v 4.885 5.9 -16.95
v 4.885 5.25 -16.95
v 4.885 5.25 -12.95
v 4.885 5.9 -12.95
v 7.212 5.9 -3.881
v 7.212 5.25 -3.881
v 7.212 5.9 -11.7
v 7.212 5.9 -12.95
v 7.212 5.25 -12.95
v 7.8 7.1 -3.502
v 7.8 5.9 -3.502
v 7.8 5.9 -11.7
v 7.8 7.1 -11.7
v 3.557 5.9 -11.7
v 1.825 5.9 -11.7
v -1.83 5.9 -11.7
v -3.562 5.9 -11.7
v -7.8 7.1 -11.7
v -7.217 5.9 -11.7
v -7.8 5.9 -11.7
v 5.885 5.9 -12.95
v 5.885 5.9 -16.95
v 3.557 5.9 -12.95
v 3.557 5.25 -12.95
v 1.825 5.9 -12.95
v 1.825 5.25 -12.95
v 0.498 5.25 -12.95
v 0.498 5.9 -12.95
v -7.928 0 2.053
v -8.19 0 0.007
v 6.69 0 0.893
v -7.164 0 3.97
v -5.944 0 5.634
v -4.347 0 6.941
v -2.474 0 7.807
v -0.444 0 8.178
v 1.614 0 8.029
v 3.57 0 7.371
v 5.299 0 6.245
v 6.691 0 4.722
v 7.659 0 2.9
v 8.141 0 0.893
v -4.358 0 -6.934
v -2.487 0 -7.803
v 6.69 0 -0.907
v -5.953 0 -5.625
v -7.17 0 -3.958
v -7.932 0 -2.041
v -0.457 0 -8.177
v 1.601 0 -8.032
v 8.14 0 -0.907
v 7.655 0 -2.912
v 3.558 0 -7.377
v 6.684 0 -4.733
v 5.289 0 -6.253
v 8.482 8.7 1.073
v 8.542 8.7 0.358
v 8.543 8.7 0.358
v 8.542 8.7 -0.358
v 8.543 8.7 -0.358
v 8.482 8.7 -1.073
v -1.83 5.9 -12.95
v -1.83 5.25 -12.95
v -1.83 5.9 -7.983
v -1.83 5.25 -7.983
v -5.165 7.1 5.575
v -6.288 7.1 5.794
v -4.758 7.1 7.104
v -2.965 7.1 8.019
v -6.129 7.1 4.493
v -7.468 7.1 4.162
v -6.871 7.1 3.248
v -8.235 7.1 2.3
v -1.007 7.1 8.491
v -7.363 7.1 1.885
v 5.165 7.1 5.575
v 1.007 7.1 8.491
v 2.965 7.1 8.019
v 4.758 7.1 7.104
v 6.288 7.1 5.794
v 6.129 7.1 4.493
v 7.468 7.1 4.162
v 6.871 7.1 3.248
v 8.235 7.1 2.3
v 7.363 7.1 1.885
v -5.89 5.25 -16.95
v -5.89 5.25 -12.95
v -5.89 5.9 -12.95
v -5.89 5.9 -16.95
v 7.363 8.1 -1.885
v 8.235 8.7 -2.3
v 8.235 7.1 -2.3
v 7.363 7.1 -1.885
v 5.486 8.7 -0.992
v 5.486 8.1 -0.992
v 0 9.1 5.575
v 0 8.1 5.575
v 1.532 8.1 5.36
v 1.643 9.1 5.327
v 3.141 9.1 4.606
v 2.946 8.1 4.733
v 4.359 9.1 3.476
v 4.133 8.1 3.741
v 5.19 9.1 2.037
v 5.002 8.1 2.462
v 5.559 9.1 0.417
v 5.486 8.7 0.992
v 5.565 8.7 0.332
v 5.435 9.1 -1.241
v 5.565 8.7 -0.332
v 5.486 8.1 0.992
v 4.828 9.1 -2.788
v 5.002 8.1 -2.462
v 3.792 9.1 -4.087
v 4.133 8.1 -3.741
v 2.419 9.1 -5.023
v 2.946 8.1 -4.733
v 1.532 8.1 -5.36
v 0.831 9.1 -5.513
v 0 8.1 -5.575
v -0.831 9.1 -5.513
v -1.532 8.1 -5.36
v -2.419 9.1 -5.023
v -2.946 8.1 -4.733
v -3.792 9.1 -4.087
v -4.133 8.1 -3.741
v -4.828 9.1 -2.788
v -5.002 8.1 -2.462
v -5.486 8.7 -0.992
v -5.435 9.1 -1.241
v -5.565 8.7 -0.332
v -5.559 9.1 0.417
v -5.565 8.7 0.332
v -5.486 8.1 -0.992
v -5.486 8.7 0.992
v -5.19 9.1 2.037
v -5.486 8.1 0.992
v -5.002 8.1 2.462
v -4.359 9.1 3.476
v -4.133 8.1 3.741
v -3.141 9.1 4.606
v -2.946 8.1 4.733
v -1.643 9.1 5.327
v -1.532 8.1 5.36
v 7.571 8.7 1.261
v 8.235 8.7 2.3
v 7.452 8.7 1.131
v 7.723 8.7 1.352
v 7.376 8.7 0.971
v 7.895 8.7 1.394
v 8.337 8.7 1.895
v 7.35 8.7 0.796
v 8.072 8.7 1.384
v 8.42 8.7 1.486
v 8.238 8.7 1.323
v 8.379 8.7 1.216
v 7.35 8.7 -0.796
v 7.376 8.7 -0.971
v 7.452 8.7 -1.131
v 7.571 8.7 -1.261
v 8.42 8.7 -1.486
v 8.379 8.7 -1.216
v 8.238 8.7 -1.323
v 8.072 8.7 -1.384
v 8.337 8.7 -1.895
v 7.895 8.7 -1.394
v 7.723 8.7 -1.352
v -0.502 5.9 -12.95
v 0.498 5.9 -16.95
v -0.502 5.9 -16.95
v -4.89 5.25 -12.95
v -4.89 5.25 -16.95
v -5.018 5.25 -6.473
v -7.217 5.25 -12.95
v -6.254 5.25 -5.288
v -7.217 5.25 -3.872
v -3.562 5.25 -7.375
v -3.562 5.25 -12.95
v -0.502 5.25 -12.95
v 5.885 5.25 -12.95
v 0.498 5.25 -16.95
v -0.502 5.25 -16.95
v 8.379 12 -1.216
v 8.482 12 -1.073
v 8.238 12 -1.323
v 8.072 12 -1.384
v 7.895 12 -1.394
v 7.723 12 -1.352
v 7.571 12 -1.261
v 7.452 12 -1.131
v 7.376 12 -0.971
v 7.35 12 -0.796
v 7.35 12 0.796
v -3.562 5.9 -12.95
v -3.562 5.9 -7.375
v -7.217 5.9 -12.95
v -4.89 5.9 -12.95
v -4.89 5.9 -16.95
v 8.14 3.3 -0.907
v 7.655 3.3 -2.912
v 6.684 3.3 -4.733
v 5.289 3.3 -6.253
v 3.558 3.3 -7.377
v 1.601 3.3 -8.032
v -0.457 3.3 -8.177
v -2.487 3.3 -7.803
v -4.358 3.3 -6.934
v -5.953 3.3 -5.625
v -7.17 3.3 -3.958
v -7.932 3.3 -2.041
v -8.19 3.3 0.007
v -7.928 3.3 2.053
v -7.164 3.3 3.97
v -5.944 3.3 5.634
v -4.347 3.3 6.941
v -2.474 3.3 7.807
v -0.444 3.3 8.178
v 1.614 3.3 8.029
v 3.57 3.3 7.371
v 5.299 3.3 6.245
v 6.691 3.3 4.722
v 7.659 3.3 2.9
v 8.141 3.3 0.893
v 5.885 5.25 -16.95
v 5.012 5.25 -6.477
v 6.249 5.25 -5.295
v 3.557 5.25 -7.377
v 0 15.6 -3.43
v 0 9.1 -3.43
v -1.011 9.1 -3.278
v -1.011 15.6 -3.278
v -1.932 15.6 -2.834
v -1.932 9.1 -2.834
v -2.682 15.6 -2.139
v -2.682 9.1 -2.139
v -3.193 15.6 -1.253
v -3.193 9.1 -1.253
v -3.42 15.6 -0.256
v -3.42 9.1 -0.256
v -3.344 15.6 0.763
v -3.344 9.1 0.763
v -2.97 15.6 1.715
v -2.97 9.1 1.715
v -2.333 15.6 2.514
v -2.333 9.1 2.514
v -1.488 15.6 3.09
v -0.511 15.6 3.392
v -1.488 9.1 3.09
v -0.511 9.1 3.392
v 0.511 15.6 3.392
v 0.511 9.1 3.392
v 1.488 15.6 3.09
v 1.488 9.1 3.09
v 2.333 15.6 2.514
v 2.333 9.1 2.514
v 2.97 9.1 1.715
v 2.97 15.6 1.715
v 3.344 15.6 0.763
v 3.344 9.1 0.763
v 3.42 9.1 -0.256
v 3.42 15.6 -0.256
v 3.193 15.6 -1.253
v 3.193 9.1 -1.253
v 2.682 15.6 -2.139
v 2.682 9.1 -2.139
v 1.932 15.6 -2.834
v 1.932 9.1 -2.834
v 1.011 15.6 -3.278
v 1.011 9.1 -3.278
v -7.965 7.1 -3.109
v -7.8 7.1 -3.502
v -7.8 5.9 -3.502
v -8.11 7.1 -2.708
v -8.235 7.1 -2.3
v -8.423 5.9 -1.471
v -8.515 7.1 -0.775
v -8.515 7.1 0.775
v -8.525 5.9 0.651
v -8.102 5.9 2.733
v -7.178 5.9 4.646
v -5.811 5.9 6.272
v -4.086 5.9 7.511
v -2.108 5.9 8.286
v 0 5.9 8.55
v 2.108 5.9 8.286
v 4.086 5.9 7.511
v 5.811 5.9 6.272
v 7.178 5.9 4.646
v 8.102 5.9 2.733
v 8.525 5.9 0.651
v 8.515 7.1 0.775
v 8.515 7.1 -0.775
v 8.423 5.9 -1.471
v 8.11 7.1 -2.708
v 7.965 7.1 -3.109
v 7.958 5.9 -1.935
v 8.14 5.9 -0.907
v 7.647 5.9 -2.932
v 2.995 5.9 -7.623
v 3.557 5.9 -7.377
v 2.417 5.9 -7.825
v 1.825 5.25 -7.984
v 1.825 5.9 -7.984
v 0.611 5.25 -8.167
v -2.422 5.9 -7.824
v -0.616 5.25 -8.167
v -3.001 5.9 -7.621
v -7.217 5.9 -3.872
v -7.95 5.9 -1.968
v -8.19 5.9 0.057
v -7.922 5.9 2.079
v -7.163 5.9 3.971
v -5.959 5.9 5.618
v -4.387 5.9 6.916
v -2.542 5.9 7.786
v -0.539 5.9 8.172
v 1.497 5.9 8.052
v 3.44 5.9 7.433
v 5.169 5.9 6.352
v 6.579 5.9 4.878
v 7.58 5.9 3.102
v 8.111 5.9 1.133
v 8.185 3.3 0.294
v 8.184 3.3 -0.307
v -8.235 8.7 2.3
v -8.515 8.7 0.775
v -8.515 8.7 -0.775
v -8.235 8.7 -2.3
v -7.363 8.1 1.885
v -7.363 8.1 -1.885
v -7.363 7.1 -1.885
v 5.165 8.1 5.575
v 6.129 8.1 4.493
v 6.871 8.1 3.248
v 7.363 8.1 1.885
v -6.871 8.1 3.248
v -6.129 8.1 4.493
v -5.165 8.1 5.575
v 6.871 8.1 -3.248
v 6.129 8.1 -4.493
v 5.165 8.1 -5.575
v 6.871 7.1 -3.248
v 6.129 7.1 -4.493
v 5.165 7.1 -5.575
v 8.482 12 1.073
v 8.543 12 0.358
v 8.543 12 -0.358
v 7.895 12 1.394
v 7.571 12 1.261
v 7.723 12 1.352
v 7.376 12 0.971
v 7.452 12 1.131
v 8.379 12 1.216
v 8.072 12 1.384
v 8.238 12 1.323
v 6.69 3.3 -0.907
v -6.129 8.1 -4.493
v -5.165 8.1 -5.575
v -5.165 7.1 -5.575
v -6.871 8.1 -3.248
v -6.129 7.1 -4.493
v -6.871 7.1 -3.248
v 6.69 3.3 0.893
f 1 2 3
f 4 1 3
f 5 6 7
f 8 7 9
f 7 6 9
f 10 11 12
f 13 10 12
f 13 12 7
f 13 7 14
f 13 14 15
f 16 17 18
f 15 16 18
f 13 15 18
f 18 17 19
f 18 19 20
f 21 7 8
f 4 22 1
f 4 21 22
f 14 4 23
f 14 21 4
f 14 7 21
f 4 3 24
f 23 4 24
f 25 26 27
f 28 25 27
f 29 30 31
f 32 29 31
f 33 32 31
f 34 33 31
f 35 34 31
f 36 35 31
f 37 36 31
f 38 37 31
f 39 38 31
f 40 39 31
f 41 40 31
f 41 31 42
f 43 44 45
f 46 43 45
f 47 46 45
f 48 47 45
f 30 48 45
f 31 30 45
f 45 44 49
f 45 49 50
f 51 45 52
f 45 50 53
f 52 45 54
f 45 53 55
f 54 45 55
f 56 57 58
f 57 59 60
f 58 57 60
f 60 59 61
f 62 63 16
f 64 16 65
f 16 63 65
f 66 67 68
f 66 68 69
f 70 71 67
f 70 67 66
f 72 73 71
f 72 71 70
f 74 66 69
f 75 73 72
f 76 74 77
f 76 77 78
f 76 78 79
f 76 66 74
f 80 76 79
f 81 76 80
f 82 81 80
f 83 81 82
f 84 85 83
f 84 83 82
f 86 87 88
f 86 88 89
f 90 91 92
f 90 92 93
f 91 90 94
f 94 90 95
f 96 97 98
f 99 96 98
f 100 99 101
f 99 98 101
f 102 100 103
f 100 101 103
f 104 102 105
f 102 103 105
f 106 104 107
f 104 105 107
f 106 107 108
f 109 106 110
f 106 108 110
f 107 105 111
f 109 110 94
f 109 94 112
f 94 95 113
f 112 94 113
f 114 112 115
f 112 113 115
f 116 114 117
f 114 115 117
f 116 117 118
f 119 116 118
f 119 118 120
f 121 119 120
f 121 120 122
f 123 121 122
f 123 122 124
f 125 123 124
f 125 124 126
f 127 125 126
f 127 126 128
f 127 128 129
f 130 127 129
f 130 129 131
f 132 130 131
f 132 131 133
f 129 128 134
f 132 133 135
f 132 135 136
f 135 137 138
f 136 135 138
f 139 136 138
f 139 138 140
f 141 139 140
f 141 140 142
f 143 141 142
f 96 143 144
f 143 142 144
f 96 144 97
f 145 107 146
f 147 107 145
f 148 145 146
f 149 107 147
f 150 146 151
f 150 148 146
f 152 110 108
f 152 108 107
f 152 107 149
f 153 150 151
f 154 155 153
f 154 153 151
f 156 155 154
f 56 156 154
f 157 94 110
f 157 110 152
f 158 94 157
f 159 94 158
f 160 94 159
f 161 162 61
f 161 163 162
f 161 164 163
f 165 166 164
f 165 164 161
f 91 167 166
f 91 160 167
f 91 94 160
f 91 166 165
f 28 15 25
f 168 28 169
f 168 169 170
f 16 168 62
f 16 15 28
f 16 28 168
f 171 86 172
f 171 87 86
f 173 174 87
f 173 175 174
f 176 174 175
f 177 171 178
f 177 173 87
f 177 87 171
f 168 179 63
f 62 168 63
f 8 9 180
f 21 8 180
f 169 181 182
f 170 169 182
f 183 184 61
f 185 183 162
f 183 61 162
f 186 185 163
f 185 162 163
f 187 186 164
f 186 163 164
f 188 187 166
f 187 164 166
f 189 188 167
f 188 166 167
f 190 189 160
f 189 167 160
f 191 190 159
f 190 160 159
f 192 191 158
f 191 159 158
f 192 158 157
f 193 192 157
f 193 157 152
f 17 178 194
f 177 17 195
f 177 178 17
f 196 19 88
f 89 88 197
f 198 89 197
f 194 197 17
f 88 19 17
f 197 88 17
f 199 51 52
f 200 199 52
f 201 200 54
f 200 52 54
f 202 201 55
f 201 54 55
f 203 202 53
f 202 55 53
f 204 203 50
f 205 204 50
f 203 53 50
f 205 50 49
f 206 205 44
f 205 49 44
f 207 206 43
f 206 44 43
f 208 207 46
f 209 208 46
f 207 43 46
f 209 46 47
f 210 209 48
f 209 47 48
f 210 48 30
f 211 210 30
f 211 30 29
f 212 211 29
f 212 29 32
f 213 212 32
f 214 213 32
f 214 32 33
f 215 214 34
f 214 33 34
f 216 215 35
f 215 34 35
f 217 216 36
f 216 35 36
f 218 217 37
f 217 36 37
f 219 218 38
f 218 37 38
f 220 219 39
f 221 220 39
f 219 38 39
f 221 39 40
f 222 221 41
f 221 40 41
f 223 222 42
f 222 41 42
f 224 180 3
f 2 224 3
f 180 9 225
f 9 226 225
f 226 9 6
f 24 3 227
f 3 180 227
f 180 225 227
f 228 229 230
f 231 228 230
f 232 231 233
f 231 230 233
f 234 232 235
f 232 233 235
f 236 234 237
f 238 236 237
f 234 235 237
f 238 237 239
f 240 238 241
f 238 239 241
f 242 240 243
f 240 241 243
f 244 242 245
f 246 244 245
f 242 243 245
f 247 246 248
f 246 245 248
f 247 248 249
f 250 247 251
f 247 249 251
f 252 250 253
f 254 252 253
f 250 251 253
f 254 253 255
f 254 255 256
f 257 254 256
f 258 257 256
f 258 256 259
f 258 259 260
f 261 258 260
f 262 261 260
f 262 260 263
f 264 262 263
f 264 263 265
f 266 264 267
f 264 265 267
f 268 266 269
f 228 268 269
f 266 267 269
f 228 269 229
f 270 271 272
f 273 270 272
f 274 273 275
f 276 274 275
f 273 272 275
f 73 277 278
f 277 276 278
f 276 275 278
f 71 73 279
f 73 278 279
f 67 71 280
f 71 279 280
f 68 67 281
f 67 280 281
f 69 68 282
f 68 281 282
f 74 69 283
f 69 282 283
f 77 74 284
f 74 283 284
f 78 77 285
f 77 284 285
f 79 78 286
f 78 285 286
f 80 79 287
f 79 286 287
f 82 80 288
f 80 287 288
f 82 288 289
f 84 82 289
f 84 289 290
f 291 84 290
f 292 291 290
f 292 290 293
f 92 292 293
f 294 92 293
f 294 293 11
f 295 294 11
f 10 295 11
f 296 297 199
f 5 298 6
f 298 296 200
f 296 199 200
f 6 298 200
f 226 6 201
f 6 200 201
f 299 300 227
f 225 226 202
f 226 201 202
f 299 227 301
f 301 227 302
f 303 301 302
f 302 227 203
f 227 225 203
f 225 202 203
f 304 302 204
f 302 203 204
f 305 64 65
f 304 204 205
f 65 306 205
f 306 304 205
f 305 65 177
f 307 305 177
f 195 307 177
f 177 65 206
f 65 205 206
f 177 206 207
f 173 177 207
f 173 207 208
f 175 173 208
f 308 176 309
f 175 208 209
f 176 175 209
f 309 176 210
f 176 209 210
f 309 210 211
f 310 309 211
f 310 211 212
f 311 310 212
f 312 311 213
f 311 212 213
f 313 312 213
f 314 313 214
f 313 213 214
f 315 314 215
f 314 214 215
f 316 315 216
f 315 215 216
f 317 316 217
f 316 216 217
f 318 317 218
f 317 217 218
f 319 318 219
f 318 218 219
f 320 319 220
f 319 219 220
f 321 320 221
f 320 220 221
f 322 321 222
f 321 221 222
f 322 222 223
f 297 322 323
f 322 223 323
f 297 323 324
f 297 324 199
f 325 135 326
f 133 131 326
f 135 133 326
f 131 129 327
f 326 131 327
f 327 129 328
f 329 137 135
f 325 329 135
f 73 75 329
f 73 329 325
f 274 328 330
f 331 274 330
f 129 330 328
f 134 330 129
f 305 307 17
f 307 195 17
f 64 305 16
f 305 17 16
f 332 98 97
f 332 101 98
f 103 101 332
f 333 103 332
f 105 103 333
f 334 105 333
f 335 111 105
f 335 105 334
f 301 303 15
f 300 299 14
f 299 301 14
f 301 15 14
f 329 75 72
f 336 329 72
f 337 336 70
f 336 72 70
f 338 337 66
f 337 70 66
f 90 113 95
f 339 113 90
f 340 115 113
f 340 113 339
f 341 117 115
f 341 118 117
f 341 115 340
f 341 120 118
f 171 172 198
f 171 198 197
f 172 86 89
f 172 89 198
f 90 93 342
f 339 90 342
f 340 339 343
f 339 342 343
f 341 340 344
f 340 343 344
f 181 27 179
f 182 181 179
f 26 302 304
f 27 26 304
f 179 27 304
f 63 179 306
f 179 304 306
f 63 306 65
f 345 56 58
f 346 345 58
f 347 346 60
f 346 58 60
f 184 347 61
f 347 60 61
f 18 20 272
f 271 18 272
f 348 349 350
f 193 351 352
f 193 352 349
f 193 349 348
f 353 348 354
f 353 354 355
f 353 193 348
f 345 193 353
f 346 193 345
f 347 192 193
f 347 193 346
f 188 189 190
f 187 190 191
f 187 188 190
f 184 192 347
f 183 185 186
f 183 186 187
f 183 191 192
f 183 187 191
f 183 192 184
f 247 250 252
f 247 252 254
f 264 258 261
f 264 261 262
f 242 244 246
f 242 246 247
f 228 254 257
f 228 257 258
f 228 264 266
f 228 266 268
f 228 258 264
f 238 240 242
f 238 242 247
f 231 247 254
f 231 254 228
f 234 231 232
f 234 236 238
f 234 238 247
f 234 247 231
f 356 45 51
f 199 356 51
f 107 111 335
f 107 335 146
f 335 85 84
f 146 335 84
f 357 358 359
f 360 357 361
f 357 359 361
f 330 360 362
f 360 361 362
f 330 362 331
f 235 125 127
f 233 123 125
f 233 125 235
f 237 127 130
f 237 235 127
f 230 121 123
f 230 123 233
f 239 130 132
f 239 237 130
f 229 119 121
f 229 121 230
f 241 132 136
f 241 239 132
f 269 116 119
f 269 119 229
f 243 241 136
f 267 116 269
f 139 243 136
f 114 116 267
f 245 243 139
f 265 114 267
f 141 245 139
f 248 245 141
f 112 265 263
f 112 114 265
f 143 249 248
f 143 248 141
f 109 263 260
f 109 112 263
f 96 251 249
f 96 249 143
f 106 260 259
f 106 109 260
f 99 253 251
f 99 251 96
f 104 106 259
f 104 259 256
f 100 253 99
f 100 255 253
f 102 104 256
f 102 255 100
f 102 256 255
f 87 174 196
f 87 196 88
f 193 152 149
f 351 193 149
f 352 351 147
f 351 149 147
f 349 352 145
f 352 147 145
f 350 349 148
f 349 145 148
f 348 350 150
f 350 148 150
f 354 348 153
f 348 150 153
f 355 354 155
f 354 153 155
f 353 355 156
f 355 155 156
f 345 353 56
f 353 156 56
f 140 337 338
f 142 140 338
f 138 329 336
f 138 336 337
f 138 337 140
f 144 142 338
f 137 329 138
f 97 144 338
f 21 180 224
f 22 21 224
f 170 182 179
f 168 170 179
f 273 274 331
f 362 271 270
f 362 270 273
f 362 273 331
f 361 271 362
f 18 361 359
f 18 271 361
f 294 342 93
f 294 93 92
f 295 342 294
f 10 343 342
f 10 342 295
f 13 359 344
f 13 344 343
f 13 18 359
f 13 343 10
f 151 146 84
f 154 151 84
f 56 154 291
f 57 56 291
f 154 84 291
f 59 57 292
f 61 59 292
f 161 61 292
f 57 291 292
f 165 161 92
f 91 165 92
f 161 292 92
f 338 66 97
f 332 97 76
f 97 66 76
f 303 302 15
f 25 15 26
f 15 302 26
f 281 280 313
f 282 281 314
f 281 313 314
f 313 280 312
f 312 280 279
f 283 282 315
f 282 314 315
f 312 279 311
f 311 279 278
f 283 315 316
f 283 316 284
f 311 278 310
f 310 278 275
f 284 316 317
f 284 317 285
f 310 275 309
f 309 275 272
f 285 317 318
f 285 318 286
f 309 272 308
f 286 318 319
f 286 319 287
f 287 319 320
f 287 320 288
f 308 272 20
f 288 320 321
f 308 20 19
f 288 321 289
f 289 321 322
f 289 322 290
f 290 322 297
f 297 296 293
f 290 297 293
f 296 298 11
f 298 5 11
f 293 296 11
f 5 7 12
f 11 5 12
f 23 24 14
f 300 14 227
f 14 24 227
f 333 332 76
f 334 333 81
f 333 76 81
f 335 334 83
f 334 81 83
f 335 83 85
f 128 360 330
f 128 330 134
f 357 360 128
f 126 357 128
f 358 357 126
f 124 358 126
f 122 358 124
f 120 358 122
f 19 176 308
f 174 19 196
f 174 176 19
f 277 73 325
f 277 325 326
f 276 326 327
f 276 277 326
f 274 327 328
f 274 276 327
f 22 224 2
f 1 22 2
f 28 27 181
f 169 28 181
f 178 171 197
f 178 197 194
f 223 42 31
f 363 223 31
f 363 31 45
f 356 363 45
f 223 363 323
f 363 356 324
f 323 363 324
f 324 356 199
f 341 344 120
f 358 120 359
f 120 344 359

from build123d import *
from build123d.topology import SkipClean

# Parameters (mm, degrees)
BOSS_EXTRUDE1_DEPTH = 3.3
SKETCH2_R           = 8.19
BOSS_EXTRUDE2_DEPTH = 2.6
BOSS_EXTRUDE3_DEPTH = 1.2
BOSS_EXTRUDE4_DEPTH = 1
SKETCH7_R           = 5.575
BOSS_EXTRUDE5_DEPTH = 1
BOSS_EXTRUDE6_DEPTH = 1.6
BOSS_EXTRUDE7_DEPTH = 3.3
SKETCH9_R           = 3.43
BOSS_EXTRUDE8_DEPTH = 6.5
BOSS_EXTRUDE9_START = 0.65
BOSS_EXTRUDE9_DEPTH = 0.65


with BuildPart() as part:
    # Sketch1 → Boss-Extrude1 (new body)
    with BuildSketch(Plane(origin=(0, 0, 0), x_dir=(1, 0, 0), z_dir=(0, 1, 0))):
        with BuildLine():
            Line((8.141120253, -0.893454545), (6.690358093, -0.893454545))
            Line((6.690358093, -0.893454545), (6.690358093, 0.906545455))
            Line((6.690358093, 0.906545455), (8.139672926, 0.906545455))
            ThreePointArc((8.139672926, 0.906545455), (-8.189997352, -0.006585337), (8.141120253, -0.893454545))
        make_face()
    extrude(amount=BOSS_EXTRUDE1_DEPTH)

    # Sketch2 → Boss-Extrude2 (add)
    with BuildSketch(Plane(origin=(0, 3.3, 0), x_dir=(1, 0, 0), z_dir=(0, 1, 0))):
        with Locations(Location((0, 0, 0), (0, 0, 6.355052824))):
            Circle(SKETCH2_R)
    extrude(amount=BOSS_EXTRUDE2_DEPTH)

    # Sketch3 → Boss-Extrude3 (add)
    with BuildSketch(Plane(origin=(0, 5.9, 0), x_dir=(1, 0, 0), z_dir=(0, 1, 0))):
        with BuildLine():
            Line((7.8, 11.7), (-7.8, 11.7))
            Line((-7.8, 11.7), (-7.8, 3.501785259))
            ThreePointArc((-7.8, 3.501785259), (0, -8.55), (7.8, 3.501785259))
            Line((7.8, 3.501785259), (7.8, 11.7))
        make_face()
    extrude(amount=BOSS_EXTRUDE3_DEPTH)

    # Sketch4 → Boss-Extrude4 (add)
    with BuildSketch(Plane(origin=(0, 7.1, 0), x_dir=(1, 0, 0), z_dir=(0, 1, 0))):
        with BuildLine():
            Line((5.165208127, 5.575), (-5.165208127, 5.575))
            ThreePointArc((-5.165208127, 5.575), (-7.6, 0), (-5.165208127, -5.575))
            Line((-5.165208127, -5.575), (5.165208127, -5.575))
            ThreePointArc((5.165208127, -5.575), (7.6, 0), (5.165208127, 5.575))
        make_face()
    extrude(amount=BOSS_EXTRUDE4_DEPTH)

    # Sketch7 → Boss-Extrude5 (add)
    with BuildSketch(Plane(origin=(0, 8.1, 0), x_dir=(1, 0, 0), z_dir=(0, 1, 0))):
        with Locations(Location((0, 0, 0), (0, 0, 270))):
            Circle(SKETCH7_R)
    extrude(amount=BOSS_EXTRUDE5_DEPTH)

    # Sketch6 → Boss-Extrude6 (add)
    with SkipClean():  # the faces are left unmerged after this step: merging them gives an invalid solid
        with BuildSketch(Plane(origin=(0, 7.1, 0), x_dir=(1, 0, 0), z_dir=(0, 1, 0))):
            with BuildLine():
                Line((8.234834546, 2.3), (5.485974002, 0.992327692))
                ThreePointArc((5.485974002, 0.992327692), (5.575, 0), (5.485974002, -0.992327692))
                Line((5.485974002, -0.992327692), (8.234834546, -2.3))
                ThreePointArc((8.234834546, -2.3), (8.55, 0), (8.234834546, 2.3))
            make_face()
            with BuildLine():
                Line((-5.485974002, -0.992327692), (-8.234834546, -2.3))
                ThreePointArc((-8.234834546, -2.3), (-8.55, 0), (-8.234834546, 2.3))
                Line((-8.234834546, 2.3), (-5.485974002, 0.992327692))
                ThreePointArc((-5.485974002, 0.992327692), (-5.575, 0), (-5.485974002, -0.992327692))
            make_face()
        extrude(amount=BOSS_EXTRUDE6_DEPTH)

    # Sketch8 → Boss-Extrude7 (add)
    with SkipClean():  # the faces are left unmerged after this step: merging them gives an invalid solid
        with BuildSketch(Plane(origin=(0, 8.7, 0), x_dir=(1, 0, 0), z_dir=(0, 1, 0))):
            with BuildLine():
                Line((7.35, 0.79614814), (7.35, -0.79614814))
                ThreePointArc((7.35, -0.79614814), (7.807638503, -1.379024154), (8.482458308, -1.072763351))
                ThreePointArc((8.482458308, -1.072763351), (8.55002457, 0), (8.482458308, 1.072763351))
                ThreePointArc((8.482458308, 1.072763351), (7.807638503, 1.379024154), (7.35, 0.79614814))
            make_face()
        extrude(amount=BOSS_EXTRUDE7_DEPTH)

    # Sketch9 → Boss-Extrude8 (add)
    with SkipClean():  # the faces are left unmerged after this step: merging them gives an invalid solid
        with BuildSketch(Plane(origin=(0, 9.1, 0), x_dir=(1, 0, 0), z_dir=(0, 1, 0))):
            with Locations(Location((0, 0, 0), (0, 0, 90))):
                Circle(SKETCH9_R)
        extrude(amount=BOSS_EXTRUDE8_DEPTH)

    # Sketch13 → Boss-Extrude9 (add)
    with SkipClean():  # the faces are left unmerged after this step: merging them gives an invalid solid
        with BuildSketch(Plane.XZ.offset(-5.9).offset(BOSS_EXTRUDE9_START)):
            with BuildLine():
                Line((1.825, -7.98407634), (1.825, -12.95))
                Line((1.825, -12.95), (0.4975, -12.95))
                Line((0.4975, -12.95), (0.4975, -16.95))
                Line((0.4975, -16.95), (-0.5025, -16.95))
                Line((-0.5025, -16.95), (-0.5025, -12.95))
                Line((-0.5025, -12.95), (-1.83, -12.95))
                Line((-1.83, -12.95), (-1.83, -7.982931792))
                ThreePointArc((-1.83, -7.982931792), (-0.002564663, -8.189999598), (1.825, -7.98407634))
            make_face()
            with BuildLine():
                Line((4.884652449, -16.95), (4.884652449, -12.95))
                Line((4.884652449, -12.95), (3.557152449, -12.95))
                Line((3.557152449, -12.95), (3.557152449, -7.37717876))
                ThreePointArc((3.557152449, -7.37717876), (5.661322251, -5.9182371), (7.212152449, -3.880844889))
                Line((7.212152449, -3.880844889), (7.212152449, -12.95))
                Line((7.212152449, -12.95), (5.884652449, -12.95))
                Line((5.884652449, -12.95), (5.884652449, -16.95))
                Line((5.884652449, -16.95), (4.884652449, -16.95))
            make_face()
            with BuildLine():
                Line((-5.889652449, -16.95), (-4.889652449, -16.95))
                Line((-4.889652449, -16.95), (-4.889652449, -12.95))
                Line((-4.889652449, -12.95), (-3.562152449, -12.95))
                Line((-3.562152449, -12.95), (-3.562152449, -7.374765754))
                ThreePointArc((-3.562152449, -7.374765754), (-5.667142471, -5.912664054), (-7.217152449, -3.871538522))
                Line((-7.217152449, -3.871538522), (-7.217152449, -12.95))
                Line((-7.217152449, -12.95), (-5.889652449, -12.95))
                Line((-5.889652449, -12.95), (-5.889652449, -16.95))
            make_face()
        extrude(amount=-BOSS_EXTRUDE9_DEPTH)


solid = part.part
